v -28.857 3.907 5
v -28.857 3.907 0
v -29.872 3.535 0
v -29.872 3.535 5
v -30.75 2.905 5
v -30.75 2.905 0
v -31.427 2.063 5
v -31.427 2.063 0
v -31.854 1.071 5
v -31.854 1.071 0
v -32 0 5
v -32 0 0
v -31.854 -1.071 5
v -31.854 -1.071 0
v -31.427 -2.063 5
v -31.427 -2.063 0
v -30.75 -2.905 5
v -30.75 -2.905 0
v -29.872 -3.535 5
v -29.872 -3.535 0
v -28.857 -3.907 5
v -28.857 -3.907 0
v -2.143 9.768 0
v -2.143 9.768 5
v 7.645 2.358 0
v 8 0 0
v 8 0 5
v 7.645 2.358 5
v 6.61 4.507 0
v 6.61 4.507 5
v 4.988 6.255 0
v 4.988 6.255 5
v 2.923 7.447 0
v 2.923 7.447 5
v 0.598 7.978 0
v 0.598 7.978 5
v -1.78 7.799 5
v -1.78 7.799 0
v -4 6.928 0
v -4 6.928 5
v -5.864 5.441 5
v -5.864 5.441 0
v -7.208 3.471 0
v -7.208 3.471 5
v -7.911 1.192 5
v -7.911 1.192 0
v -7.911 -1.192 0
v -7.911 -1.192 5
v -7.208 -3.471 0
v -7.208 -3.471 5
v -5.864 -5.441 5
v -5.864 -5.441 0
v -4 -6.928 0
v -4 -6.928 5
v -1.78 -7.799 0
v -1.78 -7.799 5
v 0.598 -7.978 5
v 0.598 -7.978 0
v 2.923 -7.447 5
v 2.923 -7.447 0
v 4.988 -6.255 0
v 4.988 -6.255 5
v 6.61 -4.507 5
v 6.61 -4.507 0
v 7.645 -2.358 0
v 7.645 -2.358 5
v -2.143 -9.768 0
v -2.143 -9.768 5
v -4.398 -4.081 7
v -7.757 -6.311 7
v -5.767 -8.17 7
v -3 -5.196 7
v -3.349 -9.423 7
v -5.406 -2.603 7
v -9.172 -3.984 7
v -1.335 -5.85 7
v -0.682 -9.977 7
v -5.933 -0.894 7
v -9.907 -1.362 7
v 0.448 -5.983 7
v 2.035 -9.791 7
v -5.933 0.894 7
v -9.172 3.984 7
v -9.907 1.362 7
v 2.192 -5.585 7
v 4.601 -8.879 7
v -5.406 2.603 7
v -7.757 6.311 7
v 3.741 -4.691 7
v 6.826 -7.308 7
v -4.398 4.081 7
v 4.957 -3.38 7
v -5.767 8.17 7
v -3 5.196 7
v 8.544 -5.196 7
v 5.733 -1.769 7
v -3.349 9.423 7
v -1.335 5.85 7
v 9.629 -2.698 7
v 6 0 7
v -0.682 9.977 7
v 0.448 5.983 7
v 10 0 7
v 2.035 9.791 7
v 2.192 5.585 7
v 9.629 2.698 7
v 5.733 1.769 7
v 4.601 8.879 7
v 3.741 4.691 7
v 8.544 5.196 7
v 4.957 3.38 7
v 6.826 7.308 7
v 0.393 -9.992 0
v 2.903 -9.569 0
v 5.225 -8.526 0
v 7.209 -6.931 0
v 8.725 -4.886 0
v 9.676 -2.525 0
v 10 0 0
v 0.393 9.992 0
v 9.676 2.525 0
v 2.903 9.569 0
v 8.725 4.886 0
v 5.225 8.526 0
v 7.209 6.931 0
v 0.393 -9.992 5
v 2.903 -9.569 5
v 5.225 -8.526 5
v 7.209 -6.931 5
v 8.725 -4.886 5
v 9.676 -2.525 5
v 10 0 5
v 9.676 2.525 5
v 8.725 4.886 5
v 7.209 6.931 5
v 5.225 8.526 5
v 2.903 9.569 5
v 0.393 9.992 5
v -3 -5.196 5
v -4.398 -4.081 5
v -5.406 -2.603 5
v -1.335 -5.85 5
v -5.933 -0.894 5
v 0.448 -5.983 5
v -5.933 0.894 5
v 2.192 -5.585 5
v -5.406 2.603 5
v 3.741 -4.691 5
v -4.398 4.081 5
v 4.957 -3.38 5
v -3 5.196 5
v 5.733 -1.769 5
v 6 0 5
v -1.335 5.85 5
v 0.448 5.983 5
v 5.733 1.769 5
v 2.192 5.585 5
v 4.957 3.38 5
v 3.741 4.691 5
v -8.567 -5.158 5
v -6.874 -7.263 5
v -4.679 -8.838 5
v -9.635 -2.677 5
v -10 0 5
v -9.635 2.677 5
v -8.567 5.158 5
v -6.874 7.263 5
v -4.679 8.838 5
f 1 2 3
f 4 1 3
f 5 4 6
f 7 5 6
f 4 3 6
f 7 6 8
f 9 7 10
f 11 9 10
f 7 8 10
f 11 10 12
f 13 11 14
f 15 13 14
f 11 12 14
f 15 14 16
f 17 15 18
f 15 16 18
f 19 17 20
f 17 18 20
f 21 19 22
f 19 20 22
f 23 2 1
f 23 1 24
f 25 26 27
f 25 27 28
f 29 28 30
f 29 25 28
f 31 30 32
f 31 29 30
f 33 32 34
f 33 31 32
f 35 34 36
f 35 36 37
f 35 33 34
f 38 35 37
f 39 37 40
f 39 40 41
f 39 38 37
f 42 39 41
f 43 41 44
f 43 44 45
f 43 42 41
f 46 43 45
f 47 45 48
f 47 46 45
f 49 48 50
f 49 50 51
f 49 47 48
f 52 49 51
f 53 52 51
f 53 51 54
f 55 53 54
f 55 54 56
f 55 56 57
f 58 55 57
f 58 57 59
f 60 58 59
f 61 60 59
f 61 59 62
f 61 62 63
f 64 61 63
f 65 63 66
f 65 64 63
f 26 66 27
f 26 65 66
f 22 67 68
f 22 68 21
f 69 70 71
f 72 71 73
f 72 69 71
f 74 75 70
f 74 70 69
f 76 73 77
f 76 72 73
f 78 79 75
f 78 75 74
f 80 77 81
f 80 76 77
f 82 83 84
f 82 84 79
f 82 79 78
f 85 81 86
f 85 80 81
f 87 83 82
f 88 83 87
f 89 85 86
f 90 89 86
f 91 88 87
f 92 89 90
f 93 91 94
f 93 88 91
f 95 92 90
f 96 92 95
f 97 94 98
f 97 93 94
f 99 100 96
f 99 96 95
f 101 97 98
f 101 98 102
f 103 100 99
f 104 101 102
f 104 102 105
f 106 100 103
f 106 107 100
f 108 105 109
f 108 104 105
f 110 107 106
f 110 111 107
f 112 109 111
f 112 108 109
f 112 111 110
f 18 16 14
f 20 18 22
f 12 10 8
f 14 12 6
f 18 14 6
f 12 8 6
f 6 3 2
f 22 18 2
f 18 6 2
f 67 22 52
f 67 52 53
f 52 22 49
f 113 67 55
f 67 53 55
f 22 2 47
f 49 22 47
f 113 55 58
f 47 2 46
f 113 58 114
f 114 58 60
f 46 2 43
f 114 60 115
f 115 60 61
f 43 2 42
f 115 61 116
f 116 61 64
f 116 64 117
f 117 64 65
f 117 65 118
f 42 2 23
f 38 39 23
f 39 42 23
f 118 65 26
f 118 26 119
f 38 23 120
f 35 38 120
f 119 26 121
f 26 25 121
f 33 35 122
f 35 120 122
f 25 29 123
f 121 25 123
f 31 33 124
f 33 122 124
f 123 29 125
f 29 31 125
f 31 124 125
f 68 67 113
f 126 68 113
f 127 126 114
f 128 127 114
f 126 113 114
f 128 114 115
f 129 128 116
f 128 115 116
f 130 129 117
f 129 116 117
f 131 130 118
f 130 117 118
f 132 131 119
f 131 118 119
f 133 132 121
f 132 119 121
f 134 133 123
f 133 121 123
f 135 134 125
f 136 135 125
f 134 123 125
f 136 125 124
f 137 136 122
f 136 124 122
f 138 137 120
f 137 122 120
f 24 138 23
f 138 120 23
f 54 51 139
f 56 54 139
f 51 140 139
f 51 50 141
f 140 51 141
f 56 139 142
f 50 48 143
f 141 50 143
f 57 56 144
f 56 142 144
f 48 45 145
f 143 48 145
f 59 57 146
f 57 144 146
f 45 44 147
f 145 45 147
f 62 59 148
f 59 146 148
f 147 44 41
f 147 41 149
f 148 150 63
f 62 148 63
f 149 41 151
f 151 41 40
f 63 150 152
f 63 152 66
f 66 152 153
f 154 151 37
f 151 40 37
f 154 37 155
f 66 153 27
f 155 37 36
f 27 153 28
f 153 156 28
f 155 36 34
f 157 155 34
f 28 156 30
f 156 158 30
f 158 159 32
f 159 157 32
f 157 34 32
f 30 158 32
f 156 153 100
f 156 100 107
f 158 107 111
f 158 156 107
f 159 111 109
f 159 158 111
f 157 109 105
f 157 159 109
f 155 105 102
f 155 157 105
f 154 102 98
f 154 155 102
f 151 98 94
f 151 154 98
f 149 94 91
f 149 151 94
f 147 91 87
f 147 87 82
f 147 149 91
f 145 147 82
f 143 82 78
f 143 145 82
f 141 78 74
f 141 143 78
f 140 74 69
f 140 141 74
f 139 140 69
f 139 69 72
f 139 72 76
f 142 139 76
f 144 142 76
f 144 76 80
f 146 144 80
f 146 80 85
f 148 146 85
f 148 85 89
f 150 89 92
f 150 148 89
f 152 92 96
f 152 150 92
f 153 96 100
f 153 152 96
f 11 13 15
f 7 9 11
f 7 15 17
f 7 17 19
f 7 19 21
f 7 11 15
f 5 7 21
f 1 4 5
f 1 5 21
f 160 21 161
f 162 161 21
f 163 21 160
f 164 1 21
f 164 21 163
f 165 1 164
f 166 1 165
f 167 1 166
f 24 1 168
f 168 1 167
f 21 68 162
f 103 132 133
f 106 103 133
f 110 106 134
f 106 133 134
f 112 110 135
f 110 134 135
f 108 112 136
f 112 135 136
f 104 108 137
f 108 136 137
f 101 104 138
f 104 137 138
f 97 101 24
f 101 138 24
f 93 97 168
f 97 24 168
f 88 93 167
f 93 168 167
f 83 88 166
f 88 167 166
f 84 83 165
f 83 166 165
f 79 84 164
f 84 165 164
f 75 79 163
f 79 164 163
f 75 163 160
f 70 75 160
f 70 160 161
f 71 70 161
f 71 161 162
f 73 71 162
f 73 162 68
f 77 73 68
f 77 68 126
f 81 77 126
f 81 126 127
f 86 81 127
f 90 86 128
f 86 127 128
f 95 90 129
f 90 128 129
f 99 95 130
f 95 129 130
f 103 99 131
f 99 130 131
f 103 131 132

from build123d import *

# Parameters (mm, degrees)
SKETCH_R      = 8
PAD_DEPTH     = 5
SKETCH001_R   = 10
SKETCH001_R_2 = 6
PAD001_DEPTH  = 2


with BuildPart() as part:
    # Sketch → Pad (new body)
    with BuildSketch(Plane.XY):
        with BuildLine():
            ThreePointArc((-2.142857, -9.76771), (10, 0), (-2.142857, 9.76771))
            Line((-28.857143, 3.907084), (-2.142857, 9.76771))
            ThreePointArc((-28.857143, 3.907084), (-32, 0), (-28.857143, -3.907084))
            Line((-2.142857, -9.76771), (-28.857143, -3.907084))
        make_face()
        Circle(SKETCH_R, mode=Mode.SUBTRACT)
    extrude(amount=PAD_DEPTH)

    # Sketch001 (on Face7 of Pad) → Pad001 (join)
    with BuildSketch(Plane.XY.offset(5)):
        Circle(SKETCH001_R)
        Circle(SKETCH001_R_2, mode=Mode.SUBTRACT)
    extrude(amount=PAD001_DEPTH)


solid = part.part
